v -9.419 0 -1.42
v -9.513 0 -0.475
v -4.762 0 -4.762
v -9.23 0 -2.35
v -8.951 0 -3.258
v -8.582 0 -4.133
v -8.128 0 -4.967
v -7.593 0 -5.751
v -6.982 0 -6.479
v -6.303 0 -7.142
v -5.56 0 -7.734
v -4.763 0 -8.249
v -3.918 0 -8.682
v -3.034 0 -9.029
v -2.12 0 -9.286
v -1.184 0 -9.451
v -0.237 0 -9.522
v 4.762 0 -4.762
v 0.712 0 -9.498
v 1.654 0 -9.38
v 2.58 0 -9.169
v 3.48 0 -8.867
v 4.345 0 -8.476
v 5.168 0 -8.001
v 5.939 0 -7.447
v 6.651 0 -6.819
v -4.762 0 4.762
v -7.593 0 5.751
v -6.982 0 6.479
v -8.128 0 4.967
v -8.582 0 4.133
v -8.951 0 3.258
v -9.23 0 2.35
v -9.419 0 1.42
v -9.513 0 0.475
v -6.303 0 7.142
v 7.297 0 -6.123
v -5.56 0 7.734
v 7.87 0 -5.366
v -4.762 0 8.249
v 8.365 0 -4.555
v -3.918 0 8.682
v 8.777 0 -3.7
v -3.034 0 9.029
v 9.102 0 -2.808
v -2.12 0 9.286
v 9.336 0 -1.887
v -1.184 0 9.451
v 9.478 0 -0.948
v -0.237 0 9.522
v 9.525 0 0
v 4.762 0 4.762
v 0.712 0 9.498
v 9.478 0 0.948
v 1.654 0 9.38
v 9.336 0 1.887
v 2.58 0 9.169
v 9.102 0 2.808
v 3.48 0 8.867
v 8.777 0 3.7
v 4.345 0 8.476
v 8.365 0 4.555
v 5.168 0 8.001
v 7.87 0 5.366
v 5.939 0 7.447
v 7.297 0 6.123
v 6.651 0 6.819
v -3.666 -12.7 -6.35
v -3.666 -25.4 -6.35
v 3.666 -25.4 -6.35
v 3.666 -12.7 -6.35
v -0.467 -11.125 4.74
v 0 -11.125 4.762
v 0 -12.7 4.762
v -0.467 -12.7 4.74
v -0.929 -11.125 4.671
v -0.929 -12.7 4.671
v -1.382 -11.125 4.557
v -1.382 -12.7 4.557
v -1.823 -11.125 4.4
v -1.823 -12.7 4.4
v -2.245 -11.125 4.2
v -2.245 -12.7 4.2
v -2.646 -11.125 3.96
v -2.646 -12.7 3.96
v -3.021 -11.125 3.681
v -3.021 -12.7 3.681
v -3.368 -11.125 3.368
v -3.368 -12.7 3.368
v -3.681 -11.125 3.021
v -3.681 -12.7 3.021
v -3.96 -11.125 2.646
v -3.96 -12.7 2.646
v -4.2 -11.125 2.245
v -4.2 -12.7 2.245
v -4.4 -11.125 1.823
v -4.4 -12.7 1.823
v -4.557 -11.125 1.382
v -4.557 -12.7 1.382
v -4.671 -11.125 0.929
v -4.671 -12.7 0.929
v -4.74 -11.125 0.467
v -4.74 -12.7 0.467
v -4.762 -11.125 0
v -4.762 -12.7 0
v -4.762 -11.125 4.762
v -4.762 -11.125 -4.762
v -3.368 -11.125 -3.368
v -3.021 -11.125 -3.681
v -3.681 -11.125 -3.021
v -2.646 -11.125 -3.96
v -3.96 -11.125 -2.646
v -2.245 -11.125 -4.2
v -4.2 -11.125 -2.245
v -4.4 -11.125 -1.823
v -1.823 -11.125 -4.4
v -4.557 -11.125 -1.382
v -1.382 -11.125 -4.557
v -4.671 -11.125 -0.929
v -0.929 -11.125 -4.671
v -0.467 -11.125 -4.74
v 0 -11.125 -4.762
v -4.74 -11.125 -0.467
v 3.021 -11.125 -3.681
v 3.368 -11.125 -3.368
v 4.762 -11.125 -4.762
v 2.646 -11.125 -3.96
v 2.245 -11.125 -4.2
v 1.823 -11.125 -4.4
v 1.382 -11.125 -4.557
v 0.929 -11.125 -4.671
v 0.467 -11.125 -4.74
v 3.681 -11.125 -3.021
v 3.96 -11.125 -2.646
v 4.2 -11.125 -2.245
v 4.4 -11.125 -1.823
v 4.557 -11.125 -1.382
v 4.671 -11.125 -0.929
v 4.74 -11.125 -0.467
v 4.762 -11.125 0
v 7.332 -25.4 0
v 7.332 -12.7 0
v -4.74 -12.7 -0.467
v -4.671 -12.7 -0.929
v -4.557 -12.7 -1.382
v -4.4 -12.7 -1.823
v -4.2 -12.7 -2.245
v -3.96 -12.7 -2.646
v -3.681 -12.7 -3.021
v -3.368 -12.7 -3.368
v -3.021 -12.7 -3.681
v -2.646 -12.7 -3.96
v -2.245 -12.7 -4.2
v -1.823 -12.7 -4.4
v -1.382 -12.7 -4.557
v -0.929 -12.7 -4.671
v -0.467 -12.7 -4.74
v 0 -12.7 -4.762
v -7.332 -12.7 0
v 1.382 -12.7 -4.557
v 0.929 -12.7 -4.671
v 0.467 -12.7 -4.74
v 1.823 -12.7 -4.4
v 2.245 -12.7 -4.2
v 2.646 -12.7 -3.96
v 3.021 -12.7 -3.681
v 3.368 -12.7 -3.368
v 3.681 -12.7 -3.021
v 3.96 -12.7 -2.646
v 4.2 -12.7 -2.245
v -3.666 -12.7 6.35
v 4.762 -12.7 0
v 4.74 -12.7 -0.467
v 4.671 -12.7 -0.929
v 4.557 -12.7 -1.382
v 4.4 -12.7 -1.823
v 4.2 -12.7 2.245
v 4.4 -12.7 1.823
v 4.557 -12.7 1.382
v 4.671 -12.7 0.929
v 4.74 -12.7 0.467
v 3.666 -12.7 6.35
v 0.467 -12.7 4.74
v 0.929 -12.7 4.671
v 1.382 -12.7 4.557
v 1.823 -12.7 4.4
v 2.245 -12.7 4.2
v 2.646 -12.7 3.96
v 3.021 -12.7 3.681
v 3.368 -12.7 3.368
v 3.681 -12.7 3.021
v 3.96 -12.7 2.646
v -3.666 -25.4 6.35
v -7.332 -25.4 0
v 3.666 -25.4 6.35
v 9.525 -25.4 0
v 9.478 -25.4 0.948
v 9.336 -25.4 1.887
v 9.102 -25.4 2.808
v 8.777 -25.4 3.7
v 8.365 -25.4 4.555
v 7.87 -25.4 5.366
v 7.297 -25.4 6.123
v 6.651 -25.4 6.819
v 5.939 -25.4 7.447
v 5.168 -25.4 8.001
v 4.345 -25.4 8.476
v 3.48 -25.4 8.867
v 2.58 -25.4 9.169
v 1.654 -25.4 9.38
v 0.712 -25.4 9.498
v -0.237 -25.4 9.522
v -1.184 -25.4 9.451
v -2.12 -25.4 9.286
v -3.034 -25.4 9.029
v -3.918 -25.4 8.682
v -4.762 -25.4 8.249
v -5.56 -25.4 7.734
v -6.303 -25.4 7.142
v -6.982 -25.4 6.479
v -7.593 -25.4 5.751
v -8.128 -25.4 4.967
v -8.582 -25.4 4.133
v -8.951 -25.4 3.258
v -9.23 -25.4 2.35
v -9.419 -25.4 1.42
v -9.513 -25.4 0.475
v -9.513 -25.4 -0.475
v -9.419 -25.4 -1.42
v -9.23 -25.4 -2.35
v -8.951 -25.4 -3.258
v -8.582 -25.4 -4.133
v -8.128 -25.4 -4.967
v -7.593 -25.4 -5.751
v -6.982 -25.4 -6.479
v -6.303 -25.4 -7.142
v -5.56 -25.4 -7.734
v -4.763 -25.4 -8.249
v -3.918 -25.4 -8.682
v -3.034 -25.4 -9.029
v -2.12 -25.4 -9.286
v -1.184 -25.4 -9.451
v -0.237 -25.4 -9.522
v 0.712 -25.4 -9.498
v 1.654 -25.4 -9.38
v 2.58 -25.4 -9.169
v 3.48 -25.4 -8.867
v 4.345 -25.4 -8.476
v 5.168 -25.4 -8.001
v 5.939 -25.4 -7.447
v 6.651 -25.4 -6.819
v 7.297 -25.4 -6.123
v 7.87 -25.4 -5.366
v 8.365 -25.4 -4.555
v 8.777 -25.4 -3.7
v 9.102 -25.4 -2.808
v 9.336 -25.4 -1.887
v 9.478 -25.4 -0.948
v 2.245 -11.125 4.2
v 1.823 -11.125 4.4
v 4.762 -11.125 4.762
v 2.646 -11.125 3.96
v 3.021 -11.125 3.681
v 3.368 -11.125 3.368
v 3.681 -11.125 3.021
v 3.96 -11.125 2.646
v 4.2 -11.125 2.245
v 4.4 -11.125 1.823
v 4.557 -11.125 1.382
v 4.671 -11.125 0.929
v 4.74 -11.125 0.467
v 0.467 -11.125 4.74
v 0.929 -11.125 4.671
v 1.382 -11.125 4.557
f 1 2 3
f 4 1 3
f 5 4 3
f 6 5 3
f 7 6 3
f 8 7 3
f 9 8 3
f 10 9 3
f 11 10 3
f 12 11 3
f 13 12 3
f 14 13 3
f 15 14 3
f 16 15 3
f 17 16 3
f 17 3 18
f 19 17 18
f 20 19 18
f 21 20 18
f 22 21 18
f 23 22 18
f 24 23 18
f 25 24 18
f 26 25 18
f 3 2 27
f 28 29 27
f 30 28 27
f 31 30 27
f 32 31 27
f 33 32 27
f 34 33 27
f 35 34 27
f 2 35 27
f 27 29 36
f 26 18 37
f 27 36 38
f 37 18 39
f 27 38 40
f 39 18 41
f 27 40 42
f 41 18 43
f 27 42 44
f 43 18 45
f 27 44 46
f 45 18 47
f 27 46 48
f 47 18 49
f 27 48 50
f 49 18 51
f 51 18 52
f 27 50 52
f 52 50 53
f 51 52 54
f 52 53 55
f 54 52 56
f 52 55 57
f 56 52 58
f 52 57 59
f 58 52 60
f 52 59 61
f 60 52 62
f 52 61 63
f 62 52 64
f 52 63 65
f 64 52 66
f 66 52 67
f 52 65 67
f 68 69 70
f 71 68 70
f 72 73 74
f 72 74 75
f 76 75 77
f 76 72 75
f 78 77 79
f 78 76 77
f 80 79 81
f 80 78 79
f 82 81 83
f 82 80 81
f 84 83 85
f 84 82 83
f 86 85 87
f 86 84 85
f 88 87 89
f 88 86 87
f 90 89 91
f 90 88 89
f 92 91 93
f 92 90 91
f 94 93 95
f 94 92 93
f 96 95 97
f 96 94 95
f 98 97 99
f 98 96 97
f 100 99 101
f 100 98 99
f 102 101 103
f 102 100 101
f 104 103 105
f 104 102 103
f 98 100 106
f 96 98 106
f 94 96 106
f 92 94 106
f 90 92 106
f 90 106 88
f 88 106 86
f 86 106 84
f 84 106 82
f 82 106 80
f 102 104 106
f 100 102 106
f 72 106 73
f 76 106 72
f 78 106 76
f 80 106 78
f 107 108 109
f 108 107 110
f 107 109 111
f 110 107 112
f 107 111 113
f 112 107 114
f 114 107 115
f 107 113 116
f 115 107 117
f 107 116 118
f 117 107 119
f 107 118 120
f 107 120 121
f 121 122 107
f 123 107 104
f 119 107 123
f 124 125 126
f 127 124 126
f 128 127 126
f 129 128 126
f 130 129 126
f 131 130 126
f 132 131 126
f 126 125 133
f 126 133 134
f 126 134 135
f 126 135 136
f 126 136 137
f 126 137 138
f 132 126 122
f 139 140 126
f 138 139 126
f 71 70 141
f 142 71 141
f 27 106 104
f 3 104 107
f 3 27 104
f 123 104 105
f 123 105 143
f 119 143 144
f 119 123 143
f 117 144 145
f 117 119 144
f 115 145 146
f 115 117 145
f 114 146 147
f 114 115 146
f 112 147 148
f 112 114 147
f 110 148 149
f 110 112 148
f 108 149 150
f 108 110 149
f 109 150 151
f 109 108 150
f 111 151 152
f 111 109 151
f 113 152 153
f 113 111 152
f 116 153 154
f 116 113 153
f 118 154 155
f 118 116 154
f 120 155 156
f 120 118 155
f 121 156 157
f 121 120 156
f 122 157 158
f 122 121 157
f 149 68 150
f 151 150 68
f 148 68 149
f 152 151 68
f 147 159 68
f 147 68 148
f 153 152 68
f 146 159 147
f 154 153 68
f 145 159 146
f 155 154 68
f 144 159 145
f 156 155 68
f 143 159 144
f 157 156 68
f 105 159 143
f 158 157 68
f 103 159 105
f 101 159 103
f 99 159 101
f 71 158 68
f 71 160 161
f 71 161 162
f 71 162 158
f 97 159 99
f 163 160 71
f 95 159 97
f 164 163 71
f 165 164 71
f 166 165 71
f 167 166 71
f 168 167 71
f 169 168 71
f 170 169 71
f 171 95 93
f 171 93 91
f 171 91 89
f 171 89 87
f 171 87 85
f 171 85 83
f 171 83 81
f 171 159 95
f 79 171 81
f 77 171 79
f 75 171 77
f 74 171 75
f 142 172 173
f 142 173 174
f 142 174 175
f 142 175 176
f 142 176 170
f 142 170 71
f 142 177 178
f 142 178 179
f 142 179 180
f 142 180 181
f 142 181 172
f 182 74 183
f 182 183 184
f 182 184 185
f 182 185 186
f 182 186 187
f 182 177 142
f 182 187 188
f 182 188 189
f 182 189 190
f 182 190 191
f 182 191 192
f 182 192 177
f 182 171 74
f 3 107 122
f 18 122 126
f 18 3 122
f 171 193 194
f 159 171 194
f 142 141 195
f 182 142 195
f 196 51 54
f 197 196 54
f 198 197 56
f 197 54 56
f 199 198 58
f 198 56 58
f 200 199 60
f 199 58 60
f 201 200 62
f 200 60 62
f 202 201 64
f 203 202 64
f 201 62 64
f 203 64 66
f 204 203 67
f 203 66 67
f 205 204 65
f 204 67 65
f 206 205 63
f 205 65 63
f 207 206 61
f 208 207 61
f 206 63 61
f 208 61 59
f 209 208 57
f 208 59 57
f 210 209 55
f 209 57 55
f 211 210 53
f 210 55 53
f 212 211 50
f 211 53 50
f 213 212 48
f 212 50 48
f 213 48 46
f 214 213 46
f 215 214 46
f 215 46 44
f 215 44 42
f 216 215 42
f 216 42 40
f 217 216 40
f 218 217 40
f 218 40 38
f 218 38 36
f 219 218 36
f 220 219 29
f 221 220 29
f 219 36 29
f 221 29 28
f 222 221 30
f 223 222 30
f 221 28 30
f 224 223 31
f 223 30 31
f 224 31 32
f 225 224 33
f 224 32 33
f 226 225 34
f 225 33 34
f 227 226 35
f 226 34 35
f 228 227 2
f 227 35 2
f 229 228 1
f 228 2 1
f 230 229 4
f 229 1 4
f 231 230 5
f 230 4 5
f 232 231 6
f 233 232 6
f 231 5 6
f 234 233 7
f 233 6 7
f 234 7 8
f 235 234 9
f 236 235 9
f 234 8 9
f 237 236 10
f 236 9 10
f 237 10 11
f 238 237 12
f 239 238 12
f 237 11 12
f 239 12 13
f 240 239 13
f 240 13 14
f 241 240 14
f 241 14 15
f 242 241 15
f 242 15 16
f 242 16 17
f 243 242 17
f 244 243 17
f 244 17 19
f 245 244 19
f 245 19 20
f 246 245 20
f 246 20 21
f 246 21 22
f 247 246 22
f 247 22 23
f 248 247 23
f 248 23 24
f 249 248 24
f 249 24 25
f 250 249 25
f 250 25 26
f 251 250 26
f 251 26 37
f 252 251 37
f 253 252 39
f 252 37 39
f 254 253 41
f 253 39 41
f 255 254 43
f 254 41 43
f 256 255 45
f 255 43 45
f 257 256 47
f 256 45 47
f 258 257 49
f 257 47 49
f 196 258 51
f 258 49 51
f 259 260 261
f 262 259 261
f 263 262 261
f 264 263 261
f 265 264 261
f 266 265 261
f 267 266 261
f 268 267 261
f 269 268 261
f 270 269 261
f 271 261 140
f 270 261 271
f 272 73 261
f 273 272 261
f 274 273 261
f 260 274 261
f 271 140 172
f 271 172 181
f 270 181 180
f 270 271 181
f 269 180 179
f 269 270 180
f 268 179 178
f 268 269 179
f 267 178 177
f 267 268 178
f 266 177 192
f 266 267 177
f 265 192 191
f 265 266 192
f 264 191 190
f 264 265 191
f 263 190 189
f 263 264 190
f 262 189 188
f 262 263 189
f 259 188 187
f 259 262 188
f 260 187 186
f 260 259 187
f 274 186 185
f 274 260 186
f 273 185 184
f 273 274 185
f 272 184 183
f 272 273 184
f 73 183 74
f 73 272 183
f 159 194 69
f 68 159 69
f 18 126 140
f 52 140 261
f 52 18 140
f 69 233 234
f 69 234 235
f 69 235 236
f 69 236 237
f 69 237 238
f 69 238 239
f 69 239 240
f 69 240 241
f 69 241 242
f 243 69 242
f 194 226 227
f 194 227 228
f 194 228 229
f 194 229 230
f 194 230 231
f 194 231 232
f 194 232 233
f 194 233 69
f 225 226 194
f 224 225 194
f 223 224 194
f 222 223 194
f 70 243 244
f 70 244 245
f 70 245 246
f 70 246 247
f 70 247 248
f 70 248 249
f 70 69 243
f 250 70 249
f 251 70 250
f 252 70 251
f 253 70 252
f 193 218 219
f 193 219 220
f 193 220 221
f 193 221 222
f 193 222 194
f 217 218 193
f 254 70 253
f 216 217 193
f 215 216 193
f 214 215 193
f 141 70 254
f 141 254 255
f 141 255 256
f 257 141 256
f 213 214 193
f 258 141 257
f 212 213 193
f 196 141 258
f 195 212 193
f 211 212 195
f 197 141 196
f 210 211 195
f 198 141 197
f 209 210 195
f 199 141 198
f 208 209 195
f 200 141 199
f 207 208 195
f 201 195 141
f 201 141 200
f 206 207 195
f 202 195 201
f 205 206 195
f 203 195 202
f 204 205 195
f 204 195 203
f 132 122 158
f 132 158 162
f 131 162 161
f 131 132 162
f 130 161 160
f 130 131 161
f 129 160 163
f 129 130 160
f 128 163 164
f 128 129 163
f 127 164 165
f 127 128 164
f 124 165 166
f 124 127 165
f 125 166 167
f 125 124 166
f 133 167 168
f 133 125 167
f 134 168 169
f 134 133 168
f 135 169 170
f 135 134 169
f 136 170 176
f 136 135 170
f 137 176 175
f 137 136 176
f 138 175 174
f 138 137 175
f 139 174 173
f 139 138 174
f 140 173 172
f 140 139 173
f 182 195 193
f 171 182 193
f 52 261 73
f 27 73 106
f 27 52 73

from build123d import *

# Parameters (mm, degrees)
F0_R     = 9.525
F1_DEPTH = 25.4
F3_DEPTH = 25.401
F4_DEPTH = 11.1252
F6_DEPTH = 12.7


with BuildPart() as f1:
    # F0 (on Front) → F1 (new body)
    with BuildSketch(Plane.XZ):
        Circle(F0_R)
    extrude(amount=F1_DEPTH)

    # F2 (on Front) → F3 (cut, through all)
    with BuildSketch(Plane.XZ):
        with BuildLine():
            ThreePointArc((-4.7625, 0), (-3.367596, -3.367596), (0, -4.7625))
            ThreePointArc((0, -4.7625), (3.367596, -3.367596), (4.7625, 0))
            ThreePointArc((4.7625, 0), (3.367596, 3.367596), (0, 4.7625))
            ThreePointArc((0, 4.7625), (-3.367596, 3.367596), (-4.7625, 0))
        make_face()
    extrude(amount=F3_DEPTH, mode=Mode.SUBTRACT)

    # F2 (on Front) → F4 (cut)
    with BuildSketch(Plane.XZ):
        with BuildLine():
            ThreePointArc((0, 4.7625), (3.367596, 3.367596), (4.7625, 0))
            Line((4.7625, 0), (4.7625, 4.7625))
            Line((4.7625, 4.7625), (0, 4.7625))
        make_face()
        with BuildLine():
            Line((-4.7625, 4.7625), (-4.7625, 0))
            ThreePointArc((-4.7625, 0), (-3.367596, 3.367596), (0, 4.7625))
            Line((0, 4.7625), (-4.7625, 4.7625))
        make_face()
        with BuildLine():
            Line((-4.7625, -4.7625), (0, -4.7625))
            ThreePointArc((0, -4.7625), (-3.367596, -3.367596), (-4.7625, 0))
            Line((-4.7625, 0), (-4.7625, -4.7625))
        make_face()
        with BuildLine():
            Line((0, -4.7625), (4.7625, -4.7625))
            Line((4.7625, -4.7625), (4.7625, 0))
            ThreePointArc((4.7625, 0), (3.367596, -3.367596), (0, -4.7625))
        make_face()
    extrude(amount=F4_DEPTH, mode=Mode.SUBTRACT)

    # F5 (on face) → F6 (cut)
    with BuildSketch(Plane.XZ.offset(25.4)):
        Polygon((3.666174, -6.35), (7.332348, 0), (3.666174, 6.35), (-3.666174, 6.35), (-7.332348, 0), (-3.666174, -6.35), align=None)
    extrude(amount=-F6_DEPTH, mode=Mode.SUBTRACT)


solid = f1.part
